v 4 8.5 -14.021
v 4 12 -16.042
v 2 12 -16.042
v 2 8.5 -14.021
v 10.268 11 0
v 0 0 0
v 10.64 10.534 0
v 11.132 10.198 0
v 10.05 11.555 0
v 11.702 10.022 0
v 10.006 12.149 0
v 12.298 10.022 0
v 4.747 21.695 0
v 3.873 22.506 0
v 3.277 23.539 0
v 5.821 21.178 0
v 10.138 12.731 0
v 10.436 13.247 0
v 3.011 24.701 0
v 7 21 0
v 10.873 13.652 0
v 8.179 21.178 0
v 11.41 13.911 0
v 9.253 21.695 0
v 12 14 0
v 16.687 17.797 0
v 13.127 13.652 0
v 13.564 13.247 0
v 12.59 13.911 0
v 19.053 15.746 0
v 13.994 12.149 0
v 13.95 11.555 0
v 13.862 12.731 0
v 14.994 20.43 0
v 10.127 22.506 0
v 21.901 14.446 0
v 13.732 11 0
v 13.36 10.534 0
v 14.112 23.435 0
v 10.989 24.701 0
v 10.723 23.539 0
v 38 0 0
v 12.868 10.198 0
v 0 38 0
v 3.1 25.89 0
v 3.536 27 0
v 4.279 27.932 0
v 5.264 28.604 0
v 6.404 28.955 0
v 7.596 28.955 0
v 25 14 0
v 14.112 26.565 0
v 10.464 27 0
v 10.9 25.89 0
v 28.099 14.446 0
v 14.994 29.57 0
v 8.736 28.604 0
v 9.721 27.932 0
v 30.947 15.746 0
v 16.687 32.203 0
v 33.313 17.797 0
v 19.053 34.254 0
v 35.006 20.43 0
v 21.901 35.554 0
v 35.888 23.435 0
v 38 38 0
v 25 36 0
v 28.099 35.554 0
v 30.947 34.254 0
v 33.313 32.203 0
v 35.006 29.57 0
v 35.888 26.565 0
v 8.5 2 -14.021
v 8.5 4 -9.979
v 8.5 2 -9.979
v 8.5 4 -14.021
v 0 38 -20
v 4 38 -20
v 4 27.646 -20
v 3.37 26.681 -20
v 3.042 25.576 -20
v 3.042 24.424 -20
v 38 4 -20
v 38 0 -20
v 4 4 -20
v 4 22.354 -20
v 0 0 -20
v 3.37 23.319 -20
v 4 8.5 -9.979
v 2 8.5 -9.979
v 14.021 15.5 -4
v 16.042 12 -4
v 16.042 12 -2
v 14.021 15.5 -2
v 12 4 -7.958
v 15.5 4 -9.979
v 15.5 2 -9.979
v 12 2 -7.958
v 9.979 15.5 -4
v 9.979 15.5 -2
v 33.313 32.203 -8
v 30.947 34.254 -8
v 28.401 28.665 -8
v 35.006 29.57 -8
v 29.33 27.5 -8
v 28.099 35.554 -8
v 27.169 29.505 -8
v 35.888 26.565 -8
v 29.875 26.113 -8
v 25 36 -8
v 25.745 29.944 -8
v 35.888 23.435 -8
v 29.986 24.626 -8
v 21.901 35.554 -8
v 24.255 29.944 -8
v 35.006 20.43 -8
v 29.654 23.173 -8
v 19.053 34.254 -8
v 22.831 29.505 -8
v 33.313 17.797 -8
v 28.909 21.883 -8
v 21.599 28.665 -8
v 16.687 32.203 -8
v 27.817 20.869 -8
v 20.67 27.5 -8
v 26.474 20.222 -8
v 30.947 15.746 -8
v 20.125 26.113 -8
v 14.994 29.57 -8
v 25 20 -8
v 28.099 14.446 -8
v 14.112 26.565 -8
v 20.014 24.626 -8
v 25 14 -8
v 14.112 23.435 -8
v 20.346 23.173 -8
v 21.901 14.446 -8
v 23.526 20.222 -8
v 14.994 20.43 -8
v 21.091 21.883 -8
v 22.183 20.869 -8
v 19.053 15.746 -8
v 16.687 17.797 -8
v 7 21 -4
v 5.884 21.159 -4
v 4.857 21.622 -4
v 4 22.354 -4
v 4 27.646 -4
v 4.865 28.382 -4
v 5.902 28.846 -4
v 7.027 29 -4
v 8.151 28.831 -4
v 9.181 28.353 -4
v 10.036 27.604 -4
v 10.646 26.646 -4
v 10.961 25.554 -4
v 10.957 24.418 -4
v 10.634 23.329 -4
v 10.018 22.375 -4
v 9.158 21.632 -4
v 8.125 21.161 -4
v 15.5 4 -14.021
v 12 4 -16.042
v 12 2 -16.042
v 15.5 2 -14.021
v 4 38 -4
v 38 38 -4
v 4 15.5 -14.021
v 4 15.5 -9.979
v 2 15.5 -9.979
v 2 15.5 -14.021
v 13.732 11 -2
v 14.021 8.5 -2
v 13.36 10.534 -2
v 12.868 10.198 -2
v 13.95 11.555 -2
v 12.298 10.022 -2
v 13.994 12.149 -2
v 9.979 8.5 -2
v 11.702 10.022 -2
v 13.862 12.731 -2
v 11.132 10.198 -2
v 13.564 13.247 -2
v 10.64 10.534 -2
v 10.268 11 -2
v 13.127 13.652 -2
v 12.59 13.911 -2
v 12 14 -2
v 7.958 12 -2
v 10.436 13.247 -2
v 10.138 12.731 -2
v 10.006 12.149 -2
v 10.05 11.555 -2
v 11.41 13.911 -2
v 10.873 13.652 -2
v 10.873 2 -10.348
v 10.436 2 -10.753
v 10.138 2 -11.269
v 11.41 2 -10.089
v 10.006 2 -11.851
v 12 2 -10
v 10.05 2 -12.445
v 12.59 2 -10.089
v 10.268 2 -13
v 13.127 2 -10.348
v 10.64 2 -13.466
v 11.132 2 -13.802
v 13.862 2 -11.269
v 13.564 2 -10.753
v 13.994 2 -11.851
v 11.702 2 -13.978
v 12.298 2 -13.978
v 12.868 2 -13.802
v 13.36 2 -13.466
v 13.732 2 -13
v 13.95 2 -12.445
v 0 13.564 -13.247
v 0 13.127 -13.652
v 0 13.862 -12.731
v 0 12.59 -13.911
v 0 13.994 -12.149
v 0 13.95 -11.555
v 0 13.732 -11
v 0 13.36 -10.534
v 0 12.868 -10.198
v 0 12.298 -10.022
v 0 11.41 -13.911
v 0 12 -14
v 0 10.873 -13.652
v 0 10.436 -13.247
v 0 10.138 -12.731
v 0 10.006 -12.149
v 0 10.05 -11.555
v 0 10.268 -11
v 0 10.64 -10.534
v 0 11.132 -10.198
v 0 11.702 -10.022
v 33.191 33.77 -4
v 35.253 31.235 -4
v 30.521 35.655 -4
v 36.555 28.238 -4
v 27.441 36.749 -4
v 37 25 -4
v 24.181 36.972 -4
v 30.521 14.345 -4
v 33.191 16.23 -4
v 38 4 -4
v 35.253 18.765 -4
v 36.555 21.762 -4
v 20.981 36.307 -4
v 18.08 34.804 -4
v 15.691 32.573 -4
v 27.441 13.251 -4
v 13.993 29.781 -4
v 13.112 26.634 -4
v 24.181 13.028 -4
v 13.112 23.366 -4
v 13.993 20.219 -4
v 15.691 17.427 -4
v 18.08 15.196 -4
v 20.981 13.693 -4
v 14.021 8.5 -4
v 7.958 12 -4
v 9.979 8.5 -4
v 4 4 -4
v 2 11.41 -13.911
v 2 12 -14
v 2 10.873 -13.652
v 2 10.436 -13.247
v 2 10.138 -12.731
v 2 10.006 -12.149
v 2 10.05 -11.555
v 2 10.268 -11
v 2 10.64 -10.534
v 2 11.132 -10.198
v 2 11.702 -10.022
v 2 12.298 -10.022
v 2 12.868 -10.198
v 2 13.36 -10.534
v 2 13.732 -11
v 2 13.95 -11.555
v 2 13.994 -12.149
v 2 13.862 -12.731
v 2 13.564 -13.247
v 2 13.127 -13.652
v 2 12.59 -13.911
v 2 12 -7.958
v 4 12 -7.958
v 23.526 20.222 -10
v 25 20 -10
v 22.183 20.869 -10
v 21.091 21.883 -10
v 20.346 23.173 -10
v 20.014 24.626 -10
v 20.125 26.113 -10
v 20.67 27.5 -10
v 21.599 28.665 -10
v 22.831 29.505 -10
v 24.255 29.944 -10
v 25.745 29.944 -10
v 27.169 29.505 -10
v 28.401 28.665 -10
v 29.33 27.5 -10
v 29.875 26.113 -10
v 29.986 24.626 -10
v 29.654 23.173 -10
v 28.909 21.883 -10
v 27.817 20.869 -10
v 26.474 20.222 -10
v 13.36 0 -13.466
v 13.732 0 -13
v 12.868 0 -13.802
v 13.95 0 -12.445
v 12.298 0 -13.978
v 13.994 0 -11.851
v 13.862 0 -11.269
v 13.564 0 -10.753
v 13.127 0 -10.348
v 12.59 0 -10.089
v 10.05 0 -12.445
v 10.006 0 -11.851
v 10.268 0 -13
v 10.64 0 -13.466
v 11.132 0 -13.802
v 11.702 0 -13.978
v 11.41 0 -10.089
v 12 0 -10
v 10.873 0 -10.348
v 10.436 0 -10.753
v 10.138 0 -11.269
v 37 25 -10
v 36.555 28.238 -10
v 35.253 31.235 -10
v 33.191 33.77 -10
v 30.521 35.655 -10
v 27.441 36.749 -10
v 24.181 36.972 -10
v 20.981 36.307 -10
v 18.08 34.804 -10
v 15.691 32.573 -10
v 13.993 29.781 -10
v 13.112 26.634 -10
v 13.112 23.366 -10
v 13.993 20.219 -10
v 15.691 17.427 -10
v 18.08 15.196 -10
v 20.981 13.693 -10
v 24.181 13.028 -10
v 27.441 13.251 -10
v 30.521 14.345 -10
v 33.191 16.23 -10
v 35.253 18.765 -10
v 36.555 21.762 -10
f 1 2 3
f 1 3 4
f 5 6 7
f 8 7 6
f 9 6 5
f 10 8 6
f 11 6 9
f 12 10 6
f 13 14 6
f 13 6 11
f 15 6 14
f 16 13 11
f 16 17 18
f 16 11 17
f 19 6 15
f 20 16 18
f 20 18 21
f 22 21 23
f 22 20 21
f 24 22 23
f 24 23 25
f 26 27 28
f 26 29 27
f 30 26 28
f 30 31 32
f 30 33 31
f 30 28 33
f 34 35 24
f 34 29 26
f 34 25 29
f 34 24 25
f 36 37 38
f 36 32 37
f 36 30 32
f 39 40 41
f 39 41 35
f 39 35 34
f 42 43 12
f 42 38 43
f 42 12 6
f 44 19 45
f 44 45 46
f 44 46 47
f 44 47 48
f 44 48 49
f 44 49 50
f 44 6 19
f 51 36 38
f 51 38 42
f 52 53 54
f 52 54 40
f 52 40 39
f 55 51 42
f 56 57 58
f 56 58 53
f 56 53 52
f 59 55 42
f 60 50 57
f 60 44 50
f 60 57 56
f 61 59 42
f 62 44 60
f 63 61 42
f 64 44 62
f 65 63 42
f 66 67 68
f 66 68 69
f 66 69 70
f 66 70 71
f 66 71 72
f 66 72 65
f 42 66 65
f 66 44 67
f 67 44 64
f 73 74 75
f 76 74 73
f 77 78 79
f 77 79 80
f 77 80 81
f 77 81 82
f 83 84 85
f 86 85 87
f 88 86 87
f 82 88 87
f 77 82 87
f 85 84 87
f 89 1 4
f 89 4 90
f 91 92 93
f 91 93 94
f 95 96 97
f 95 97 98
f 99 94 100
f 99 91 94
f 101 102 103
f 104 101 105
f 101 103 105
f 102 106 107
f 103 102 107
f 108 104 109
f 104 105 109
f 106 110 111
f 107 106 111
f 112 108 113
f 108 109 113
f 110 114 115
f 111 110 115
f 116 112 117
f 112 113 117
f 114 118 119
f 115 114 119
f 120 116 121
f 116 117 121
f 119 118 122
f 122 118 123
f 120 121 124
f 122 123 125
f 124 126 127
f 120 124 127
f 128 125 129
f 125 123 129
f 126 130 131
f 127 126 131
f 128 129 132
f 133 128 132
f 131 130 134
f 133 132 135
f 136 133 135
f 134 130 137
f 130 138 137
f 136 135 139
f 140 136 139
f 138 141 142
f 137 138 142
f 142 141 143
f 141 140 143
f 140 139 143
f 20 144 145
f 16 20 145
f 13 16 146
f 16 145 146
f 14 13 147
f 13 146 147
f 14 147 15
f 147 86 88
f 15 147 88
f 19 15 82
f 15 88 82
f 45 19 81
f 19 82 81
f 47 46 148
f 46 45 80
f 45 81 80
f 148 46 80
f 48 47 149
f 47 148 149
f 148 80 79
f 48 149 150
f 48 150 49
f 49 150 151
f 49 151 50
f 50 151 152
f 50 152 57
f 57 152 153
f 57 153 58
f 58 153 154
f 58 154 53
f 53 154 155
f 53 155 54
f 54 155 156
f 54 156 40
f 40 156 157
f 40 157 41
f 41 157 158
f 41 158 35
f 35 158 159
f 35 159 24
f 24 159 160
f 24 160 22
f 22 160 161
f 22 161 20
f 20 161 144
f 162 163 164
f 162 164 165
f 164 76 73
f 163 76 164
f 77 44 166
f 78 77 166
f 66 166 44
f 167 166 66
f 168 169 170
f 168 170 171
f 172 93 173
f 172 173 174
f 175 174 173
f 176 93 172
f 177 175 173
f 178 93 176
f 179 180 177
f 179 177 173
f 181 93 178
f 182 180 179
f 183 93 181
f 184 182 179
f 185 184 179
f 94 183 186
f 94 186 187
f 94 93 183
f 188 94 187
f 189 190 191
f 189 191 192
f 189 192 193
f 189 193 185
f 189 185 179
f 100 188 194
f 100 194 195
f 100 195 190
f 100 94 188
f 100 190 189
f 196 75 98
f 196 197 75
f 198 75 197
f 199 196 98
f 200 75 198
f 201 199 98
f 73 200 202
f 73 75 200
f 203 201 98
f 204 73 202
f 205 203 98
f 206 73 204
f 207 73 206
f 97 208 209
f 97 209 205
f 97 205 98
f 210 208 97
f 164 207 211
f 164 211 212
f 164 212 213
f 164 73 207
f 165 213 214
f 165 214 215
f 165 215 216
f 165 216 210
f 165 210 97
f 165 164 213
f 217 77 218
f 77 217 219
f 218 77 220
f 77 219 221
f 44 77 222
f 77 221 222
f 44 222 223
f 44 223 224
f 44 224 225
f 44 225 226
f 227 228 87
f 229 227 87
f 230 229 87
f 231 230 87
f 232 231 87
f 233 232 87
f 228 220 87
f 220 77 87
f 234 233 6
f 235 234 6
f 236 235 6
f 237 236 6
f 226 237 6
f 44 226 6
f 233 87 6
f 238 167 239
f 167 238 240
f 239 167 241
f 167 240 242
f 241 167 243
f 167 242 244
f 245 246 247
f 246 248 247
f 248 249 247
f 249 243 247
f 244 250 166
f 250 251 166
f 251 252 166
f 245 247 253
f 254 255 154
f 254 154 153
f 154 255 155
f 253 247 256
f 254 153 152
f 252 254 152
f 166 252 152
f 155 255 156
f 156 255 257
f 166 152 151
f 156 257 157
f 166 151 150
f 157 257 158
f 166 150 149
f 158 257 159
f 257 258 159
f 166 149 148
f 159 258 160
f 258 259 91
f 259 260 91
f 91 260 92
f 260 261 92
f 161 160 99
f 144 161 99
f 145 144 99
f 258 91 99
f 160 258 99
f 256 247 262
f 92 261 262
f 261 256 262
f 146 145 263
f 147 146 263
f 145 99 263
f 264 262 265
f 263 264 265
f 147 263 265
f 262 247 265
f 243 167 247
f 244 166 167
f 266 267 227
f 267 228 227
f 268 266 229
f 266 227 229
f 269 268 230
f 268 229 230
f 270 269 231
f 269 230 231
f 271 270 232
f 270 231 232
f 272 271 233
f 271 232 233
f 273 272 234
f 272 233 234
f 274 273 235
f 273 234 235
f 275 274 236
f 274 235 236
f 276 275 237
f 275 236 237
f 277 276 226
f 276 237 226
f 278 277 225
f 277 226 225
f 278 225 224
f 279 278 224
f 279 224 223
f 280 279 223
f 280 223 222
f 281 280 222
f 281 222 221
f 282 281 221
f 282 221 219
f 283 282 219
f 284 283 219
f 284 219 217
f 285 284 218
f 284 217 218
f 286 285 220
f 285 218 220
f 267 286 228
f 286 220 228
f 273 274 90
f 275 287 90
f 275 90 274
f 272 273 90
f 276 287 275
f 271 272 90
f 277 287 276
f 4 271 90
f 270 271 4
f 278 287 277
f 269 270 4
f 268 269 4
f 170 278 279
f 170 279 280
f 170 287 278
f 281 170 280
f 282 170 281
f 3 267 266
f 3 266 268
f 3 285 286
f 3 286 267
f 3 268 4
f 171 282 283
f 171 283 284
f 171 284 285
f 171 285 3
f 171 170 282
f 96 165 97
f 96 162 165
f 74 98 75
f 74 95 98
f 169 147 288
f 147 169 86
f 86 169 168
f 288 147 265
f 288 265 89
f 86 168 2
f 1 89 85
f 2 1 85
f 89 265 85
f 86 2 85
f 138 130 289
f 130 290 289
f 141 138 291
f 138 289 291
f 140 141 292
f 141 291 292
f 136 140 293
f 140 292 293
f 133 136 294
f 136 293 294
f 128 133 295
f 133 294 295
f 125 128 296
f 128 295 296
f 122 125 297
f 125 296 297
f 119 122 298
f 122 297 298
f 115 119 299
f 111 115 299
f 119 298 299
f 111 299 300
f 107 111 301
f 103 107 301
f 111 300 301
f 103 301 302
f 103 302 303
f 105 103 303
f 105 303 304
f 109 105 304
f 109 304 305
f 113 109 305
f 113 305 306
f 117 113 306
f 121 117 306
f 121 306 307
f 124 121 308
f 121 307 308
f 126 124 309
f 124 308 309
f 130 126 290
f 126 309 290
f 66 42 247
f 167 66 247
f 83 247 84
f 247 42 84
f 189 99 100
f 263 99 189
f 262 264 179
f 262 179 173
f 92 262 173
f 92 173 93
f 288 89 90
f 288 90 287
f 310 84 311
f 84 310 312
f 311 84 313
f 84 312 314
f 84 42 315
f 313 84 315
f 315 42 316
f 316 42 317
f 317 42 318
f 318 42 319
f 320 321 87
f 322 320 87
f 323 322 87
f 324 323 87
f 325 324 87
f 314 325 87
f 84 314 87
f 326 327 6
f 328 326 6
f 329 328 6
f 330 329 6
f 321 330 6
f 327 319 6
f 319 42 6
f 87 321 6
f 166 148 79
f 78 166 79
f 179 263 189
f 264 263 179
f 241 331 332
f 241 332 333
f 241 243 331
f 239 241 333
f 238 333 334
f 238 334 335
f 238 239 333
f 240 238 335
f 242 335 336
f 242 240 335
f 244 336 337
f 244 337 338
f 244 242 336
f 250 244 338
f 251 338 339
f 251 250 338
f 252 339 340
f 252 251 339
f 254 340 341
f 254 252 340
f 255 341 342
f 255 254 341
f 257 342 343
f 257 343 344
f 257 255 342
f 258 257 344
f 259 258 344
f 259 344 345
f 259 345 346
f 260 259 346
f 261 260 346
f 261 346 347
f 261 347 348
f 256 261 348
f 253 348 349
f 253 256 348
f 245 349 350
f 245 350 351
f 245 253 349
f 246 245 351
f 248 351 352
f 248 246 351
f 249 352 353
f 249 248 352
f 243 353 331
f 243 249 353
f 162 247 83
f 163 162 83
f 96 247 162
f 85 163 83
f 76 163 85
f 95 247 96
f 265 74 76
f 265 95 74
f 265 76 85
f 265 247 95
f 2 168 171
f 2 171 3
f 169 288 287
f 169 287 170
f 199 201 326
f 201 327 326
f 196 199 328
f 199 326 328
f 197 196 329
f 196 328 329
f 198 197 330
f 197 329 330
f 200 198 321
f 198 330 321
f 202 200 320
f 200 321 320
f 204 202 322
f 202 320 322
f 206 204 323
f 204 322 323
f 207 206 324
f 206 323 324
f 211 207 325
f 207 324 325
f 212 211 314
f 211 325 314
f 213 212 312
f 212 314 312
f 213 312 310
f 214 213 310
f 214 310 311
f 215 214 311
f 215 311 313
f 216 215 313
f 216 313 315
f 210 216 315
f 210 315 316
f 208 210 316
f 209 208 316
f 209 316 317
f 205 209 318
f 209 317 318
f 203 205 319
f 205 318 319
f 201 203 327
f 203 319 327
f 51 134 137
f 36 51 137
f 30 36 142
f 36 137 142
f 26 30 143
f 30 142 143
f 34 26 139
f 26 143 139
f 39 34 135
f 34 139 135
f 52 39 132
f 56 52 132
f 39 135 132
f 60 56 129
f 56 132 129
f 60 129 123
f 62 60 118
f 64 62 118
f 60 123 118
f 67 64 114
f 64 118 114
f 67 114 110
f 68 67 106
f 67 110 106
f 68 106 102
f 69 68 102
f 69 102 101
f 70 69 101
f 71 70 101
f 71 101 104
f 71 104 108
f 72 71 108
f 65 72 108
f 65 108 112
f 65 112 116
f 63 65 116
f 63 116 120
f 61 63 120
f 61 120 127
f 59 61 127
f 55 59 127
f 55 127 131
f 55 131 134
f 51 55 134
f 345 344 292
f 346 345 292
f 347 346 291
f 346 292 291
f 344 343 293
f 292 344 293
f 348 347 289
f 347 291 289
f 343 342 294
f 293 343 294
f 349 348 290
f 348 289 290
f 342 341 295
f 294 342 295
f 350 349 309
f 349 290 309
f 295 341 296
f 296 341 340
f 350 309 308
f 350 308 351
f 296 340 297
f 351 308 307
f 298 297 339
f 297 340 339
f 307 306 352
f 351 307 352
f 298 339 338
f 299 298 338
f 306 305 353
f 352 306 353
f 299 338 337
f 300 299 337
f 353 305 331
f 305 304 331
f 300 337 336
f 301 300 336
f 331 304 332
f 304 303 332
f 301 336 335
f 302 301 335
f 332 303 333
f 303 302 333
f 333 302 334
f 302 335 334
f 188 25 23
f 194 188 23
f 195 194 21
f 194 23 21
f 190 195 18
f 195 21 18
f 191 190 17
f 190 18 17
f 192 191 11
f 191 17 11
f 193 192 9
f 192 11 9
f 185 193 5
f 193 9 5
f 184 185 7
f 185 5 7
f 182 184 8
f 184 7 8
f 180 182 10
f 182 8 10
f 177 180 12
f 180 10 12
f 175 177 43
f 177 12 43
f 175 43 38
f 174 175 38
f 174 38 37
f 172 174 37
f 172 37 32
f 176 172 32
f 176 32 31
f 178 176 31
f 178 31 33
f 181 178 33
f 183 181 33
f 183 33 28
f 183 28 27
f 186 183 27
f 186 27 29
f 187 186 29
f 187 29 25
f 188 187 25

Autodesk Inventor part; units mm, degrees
ref_plane "YZ Plane" through (0, 0, 0) normal (1, 0, 0) x (0, 1, 0)
ref_plane "XZ Plane" through (0, 0, 0) normal (0, 1, 0) x (-1, 0, 0)
ref_plane "XY Plane" through (0, 0, 0) normal (0, 0, 1) x (1, 0, 0)
sketch "Sketch1" plane through (0, 0, 0) normal (0, 1, 0) x (-1, 0, 0)
  line L0 (0, 0) -> (-20, 0)
  line L1 (-20, 0) -> (-20, -20)
  line L2 (-20, -20) -> (0, -20)
  line L3 (0, -20) -> (0, 0)
  dimension "d0" = 20
  dimension "d1" = 20
extrude "Extrusion1" add sketch "Sketch1" along normal blind 4
sketch "Sketch2" plane through (0, 4, 0) normal (0, 1, 0) x (1, 0, 0)
  line L0 (0, 0) -> (20, 0)
  line L1 (20, 0) -> (20, 4)
  line L2 (20, 4) -> (4, 4)
  line L3 (0, 4) -> (0, 0)
  line L4 (0, 0) -> (4, 0)
  line L5 (4, 20) -> (0, 20)
  line L6 (0, 20) -> (0, 0)
  line L7 (4, 4) -> (4, 20)
  line L8 (0, 0) -> (20, 0) projected
  line L9 (0, 0) -> (20, 0)
  line L10 (0, 20) -> (0, 0) projected
  line L11 (0, 0) -> (0, 20)
extrude "Extrusion2" add sketch "Sketch2" along normal blind 16
hole "Hole2" at (12, 12, -4) direction (0, 0, 1) diameter 4 end through all
hole "Hole3" at (4, 12, -12) direction (-1, 0, 0) diameter 4 end through all
hole "Hole4" at (12, 4, -12) direction (0, -1, 0) diameter 4 end through all
sketch "Sketch3" plane through (20, 4, -4) normal (0, 0, -1) x (-1, 0, 0)
  line L0 (12.0415, 8) -> (10.0207, 4.5)
  line L1 (10.0207, 4.5) -> (5.9793, 4.5)
  line L2 (5.9793, 4.5) -> (3.9585, 8)
  line L3 (3.9585, 8) -> (5.9793, 11.5)
  line L4 (5.9793, 11.5) -> (10.0207, 11.5)
  line L5 (10.0207, 11.5) -> (12.0415, 8)
  point P0 (20, -4)
  point P1 (8, 8)
  dimension "d51" = 7
sketch "Sketch4" plane through (4, 4, -4) normal (1, 0, 0) x (0, 0, -1)
  line L0 (12.0415, 8) -> (10.0207, 4.5)
  line L1 (10.0207, 4.5) -> (5.9793, 4.5)
  line L2 (5.9793, 4.5) -> (3.9585, 8)
  line L3 (3.9585, 8) -> (5.9793, 11.5)
  line L4 (5.9793, 11.5) -> (10.0207, 11.5)
  line L5 (10.0207, 11.5) -> (12.0415, 8)
  point P0 (-4, -4)
  point P1 (8, 8)
  dimension "d52" = 7
sketch "Sketch5" plane through (0, 4, 0) normal (0, 1, 0) x (1, 0, 0)
  circle A0 centre (12, 12) radius 2 projected
  line L0 (12, 7.9585) -> (8.5, 9.9793)
  line L1 (8.5, 9.9793) -> (8.5, 14.0207)
  line L2 (8.5, 14.0207) -> (12, 16.0415)
  line L3 (12, 16.0415) -> (15.5, 14.0207)
  line L4 (15.5, 14.0207) -> (15.5, 9.9793)
  line L5 (15.5, 9.9793) -> (12, 7.9585)
  point P0 (0, 0)
  dimension "d53" = 7
extrude "Extrusion3" cut sketch "Sketch3" against normal blind 2
extrude "Extrusion4" cut sketch "Sketch4" against normal blind 2
extrude "Extrusion5" cut sketch "Sketch5" against normal blind 2
sketch "Sketch6" plane through (0, 0, 0) normal (0, 0, 1) x (1, 0, 0)
  circle A0 centre (25, 25) radius 12
  point P0 (0, 0)
  point P1 (7, 25)
  dimension "d92" = 24
thicken "Thicken3" operation add thickness 18 both sides no extend neighbours yes toward (0, 1, 0) faces at (1.3333, 20, -8)
thicken "Thicken4" operation add thickness 18 both sides no extend neighbours yes toward (1, 0, 0) faces at (20, 14, -1.3333)
hole "Hole5" at (7, 25, 0) direction (0, 0, -1) diameter 8 end through all
extrude "Extrusion6" add sketch "Sketch6" against normal blind 10
hole "Hole7" at (25, 25, 0) direction (0, 0, -1) diameter 10 end through all counterbore diameter 22 counterbore depth 8
properties part number "Frame3WayBlockMotor" material "PLA Orange"
